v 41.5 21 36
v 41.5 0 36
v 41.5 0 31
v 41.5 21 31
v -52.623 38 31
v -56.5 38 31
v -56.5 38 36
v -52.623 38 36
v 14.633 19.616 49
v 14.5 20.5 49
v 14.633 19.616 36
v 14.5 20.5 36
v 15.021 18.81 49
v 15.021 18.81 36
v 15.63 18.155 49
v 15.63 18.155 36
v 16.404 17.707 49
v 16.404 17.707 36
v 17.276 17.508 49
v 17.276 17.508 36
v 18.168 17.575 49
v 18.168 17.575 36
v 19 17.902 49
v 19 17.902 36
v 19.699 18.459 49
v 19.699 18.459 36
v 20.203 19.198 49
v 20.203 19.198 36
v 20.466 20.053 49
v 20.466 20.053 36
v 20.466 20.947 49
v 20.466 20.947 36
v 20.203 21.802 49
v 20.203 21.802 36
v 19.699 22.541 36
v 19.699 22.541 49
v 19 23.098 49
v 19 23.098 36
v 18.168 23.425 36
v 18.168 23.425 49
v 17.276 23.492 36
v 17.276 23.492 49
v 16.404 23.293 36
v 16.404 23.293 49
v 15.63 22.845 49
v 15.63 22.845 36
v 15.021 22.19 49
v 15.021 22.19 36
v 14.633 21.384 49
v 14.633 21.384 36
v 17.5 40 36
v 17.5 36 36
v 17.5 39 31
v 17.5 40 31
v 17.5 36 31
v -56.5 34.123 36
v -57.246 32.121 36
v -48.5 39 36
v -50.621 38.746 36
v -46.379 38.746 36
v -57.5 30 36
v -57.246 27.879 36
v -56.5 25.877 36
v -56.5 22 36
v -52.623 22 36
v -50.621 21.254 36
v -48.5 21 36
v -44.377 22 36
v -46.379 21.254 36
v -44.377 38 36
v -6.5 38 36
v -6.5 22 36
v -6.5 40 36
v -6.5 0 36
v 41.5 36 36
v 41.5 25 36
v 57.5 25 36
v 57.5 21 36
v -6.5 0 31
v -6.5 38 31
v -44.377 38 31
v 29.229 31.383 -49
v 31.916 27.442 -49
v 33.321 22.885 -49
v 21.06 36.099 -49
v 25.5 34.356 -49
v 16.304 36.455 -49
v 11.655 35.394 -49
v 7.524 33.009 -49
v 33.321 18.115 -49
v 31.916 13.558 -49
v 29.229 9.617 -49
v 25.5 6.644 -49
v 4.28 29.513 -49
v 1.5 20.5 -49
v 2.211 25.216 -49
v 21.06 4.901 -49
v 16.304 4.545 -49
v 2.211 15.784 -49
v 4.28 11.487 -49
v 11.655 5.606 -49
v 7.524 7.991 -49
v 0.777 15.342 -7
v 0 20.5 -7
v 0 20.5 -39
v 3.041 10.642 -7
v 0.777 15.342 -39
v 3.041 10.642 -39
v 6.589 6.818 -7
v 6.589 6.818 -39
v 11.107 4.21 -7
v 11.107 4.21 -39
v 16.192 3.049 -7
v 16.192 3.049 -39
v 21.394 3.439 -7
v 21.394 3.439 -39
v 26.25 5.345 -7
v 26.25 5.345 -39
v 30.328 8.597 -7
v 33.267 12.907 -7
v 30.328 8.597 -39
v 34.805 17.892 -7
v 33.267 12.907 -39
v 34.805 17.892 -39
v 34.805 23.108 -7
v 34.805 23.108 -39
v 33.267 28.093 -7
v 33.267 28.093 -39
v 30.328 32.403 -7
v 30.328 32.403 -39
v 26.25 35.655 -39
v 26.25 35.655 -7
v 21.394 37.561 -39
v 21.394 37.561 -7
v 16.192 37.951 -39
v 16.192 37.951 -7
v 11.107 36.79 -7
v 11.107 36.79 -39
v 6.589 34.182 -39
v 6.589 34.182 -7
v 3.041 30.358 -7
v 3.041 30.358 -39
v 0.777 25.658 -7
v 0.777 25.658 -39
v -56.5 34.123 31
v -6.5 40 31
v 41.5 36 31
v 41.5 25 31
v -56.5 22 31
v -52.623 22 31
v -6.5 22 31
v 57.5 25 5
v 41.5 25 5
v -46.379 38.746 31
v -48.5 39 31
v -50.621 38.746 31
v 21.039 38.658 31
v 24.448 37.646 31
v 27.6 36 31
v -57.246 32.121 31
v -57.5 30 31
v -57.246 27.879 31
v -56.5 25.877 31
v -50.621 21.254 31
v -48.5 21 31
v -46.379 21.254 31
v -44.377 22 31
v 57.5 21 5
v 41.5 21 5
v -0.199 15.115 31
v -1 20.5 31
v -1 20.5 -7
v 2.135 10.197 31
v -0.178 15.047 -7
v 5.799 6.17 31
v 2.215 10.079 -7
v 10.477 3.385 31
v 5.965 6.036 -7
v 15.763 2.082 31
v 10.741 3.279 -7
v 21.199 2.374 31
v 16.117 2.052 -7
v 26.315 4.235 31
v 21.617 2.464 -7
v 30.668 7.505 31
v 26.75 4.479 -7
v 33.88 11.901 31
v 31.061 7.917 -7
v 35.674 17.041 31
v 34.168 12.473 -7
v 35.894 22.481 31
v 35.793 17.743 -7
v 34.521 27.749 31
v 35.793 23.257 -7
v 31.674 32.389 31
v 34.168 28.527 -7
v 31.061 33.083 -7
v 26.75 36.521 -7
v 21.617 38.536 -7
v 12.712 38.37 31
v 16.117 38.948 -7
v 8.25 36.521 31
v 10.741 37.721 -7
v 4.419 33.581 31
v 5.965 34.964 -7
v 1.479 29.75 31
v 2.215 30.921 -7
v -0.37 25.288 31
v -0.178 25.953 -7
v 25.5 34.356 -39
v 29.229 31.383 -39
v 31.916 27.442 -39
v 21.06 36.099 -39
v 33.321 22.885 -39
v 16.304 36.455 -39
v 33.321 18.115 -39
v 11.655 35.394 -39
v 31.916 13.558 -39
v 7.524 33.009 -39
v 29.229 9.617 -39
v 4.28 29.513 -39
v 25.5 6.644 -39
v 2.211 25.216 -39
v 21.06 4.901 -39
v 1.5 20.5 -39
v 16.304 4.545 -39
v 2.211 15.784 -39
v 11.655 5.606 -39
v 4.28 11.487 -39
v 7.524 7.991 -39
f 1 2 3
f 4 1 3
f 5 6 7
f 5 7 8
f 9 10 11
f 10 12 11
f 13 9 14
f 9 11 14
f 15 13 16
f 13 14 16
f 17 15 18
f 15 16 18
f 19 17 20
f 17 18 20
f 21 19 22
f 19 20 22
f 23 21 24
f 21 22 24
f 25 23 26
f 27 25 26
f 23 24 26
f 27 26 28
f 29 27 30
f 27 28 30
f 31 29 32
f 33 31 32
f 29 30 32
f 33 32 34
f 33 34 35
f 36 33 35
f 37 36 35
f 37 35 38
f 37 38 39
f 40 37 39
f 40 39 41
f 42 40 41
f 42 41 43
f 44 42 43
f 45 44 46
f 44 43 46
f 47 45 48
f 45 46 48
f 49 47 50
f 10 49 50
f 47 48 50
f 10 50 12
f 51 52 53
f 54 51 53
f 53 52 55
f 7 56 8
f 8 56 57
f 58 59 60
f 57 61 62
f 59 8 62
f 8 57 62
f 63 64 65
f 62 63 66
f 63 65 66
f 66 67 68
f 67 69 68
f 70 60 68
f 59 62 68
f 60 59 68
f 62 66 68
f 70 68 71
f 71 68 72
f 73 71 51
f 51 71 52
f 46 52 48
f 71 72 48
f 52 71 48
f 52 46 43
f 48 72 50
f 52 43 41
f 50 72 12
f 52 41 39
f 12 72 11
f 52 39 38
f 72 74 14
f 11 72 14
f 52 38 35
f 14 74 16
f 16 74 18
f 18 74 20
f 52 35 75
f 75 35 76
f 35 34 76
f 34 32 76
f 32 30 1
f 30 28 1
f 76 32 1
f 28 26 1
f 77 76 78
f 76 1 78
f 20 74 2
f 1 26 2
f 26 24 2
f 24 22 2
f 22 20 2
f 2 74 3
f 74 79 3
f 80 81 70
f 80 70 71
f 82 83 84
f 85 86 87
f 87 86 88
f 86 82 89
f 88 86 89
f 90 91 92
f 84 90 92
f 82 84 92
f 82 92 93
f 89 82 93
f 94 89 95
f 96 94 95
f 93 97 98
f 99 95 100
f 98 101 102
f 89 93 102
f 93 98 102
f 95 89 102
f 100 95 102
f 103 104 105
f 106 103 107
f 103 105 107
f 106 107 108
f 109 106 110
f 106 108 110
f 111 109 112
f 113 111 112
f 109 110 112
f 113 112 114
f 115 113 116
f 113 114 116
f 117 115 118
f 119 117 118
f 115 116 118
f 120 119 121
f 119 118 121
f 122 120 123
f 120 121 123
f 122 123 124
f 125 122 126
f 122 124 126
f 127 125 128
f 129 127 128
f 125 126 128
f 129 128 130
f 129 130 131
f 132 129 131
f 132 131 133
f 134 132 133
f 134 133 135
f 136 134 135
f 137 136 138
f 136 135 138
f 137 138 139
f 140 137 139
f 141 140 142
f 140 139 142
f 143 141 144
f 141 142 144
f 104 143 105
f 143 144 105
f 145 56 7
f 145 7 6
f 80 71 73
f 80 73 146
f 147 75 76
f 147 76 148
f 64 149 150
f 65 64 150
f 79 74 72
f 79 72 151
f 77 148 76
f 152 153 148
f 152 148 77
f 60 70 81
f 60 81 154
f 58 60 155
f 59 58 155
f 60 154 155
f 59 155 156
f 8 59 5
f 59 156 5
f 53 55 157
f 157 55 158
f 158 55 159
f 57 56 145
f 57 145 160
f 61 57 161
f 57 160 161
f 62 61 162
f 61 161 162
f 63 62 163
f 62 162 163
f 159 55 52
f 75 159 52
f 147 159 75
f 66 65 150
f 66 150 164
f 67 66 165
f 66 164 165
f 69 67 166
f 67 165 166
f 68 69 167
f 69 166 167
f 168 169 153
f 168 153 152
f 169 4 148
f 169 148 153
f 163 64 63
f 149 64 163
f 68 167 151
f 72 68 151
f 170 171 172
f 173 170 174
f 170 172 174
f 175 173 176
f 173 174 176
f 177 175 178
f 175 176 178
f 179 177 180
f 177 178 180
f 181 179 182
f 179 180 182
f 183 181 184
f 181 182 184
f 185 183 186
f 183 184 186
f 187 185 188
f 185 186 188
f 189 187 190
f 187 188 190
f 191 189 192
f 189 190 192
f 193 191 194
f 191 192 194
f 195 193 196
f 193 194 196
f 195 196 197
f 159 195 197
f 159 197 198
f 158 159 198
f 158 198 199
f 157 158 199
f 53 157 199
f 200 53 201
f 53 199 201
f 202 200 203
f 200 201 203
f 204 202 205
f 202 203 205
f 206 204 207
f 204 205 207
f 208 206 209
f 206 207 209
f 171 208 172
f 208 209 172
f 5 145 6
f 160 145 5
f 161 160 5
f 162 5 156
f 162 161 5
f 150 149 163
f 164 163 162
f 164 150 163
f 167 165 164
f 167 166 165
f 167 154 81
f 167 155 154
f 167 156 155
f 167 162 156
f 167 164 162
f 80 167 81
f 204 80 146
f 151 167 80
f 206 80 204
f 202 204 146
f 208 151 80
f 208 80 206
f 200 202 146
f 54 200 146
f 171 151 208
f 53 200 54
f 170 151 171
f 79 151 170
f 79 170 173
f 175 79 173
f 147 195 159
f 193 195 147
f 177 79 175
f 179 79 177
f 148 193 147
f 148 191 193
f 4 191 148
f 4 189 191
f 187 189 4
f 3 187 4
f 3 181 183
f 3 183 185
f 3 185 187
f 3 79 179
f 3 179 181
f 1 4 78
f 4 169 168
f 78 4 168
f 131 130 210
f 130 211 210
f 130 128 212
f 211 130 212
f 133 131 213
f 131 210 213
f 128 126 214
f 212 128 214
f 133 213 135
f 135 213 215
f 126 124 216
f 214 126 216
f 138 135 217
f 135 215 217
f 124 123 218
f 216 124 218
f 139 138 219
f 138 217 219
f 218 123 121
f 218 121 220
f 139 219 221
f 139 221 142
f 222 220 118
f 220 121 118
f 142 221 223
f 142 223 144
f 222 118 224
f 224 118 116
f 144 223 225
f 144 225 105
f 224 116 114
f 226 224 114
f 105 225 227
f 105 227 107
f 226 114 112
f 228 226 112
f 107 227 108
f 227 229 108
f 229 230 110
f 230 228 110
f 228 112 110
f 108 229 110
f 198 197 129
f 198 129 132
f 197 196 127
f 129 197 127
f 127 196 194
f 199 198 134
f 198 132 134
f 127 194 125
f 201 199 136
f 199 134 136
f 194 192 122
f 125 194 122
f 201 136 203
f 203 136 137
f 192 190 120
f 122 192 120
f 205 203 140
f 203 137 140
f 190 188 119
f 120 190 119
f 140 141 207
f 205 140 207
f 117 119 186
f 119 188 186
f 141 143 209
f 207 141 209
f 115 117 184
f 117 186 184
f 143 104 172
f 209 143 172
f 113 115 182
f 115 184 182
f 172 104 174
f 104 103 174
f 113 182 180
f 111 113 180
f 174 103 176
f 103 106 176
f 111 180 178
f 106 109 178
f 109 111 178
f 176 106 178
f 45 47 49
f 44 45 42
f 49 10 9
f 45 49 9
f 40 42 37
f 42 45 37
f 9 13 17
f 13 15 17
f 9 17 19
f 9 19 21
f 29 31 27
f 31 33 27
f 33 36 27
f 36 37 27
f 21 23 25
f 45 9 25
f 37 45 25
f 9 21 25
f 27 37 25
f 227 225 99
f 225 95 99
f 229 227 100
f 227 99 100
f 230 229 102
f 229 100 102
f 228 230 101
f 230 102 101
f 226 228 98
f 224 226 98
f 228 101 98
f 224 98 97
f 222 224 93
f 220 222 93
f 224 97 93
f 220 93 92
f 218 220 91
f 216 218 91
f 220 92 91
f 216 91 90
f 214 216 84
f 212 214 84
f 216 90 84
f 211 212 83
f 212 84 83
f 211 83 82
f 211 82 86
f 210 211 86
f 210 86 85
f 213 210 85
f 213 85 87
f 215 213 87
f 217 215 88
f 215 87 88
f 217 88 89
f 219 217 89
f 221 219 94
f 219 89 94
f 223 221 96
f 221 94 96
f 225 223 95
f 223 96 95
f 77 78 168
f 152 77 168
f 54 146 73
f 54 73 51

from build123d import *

# Parameters (mm, degrees)
SK_P02_MODULEPLATE_W  = 24
SK_P02_MODULEPLATE_H  = 5
P02_MODULEPLATE_DEPTH = 40
SK_P03_MODULEPLATE_W  = 24
SK_P03_MODULEPLATE_H  = 5
P03_MODULEPLATE_DEPTH = 36
P04_TRAILINGARM_START = 22
SK_P04_TRAILINGARM_W  = 50
SK_P04_TRAILINGARM_H  = 5
P04_TRAILINGARM_DEPTH = 16
P05_PIVOTBOSS_START   = 31
SK_P05_PIVOTBOSS_R    = 9
P05_PIVOTBOSS_DEPTH   = 5
P06_SPRINGTAB_START   = 21
SK_P06_SPRINGTAB_W    = 16
SK_P06_SPRINGTAB_H    = 31
P06_SPRINGTAB_DEPTH   = 4


with BuildPart() as part:
    # SK_P01_Gearmotor37Dwith64CPRenc → P01_Gearmotor37Dwith64CPRenc (revolve)
    with BuildSketch(Plane(origin=(0, 20.5, 0), x_dir=(1, 0, 0), z_dir=(0, 1, 0)), mode=Mode.PRIVATE) as p01_gearmotor37dwith64cprenc_sk:
        Polygon((17.5, -49), (20.5, -49), (20.5, -31), (36, -31), (36, 7), (35, 7), (35, 39), (33.5, 39), (33.5, 49), (17.5, 49), align=None)
    revolve(p01_gearmotor37dwith64cprenc_sk.sketch.rotate(Axis((17.5, 20.5, -54), (0, 0, 1)), 180), axis=Axis((17.5, 20.5, -54), (0, 0, 1)))

    # SK_P02_Moduleplate → P02_Moduleplate (add)
    with BuildSketch(Plane(origin=(0, 0, 0), x_dir=(1, 0, 0), z_dir=(0, 1, 0))):
        with Locations((5.5, -33.5)):
            Rectangle(SK_P02_MODULEPLATE_W, SK_P02_MODULEPLATE_H)
    extrude(amount=P02_MODULEPLATE_DEPTH)

    # SK_P03_Moduleplate → P03_Moduleplate (add)
    with BuildSketch(Plane(origin=(0, 0, 0), x_dir=(1, 0, 0), z_dir=(0, 1, 0))):
        with Locations((29.5, -33.5)):
            Rectangle(SK_P03_MODULEPLATE_W, SK_P03_MODULEPLATE_H)
    extrude(amount=P03_MODULEPLATE_DEPTH)

    # SK_P04_Trailingarm → P04_Trailingarm (add)
    with BuildSketch(Plane(origin=(0, 0, 0), x_dir=(1, 0, 0), z_dir=(0, 1, 0)).offset(P04_TRAILINGARM_START)):
        with Locations((-31.5, -33.5)):
            Rectangle(SK_P04_TRAILINGARM_W, SK_P04_TRAILINGARM_H)
    extrude(amount=P04_TRAILINGARM_DEPTH)

    # SK_P05_Pivotboss → P05_Pivotboss (add)
    with BuildSketch(Plane.XY.offset(P05_PIVOTBOSS_START)):
        with Locations((-48.5, 30)):
            Circle(SK_P05_PIVOTBOSS_R)
    extrude(amount=P05_PIVOTBOSS_DEPTH)

    # SK_P06_Springtab → P06_Springtab (add)
    with BuildSketch(Plane(origin=(0, 0, 0), x_dir=(1, 0, 0), z_dir=(0, 1, 0)).offset(P06_SPRINGTAB_START)):
        with Locations((49.5, -20.5)):
            Rectangle(SK_P06_SPRINGTAB_W, SK_P06_SPRINGTAB_H)
    extrude(amount=P06_SPRINGTAB_DEPTH)


solid = part.part
